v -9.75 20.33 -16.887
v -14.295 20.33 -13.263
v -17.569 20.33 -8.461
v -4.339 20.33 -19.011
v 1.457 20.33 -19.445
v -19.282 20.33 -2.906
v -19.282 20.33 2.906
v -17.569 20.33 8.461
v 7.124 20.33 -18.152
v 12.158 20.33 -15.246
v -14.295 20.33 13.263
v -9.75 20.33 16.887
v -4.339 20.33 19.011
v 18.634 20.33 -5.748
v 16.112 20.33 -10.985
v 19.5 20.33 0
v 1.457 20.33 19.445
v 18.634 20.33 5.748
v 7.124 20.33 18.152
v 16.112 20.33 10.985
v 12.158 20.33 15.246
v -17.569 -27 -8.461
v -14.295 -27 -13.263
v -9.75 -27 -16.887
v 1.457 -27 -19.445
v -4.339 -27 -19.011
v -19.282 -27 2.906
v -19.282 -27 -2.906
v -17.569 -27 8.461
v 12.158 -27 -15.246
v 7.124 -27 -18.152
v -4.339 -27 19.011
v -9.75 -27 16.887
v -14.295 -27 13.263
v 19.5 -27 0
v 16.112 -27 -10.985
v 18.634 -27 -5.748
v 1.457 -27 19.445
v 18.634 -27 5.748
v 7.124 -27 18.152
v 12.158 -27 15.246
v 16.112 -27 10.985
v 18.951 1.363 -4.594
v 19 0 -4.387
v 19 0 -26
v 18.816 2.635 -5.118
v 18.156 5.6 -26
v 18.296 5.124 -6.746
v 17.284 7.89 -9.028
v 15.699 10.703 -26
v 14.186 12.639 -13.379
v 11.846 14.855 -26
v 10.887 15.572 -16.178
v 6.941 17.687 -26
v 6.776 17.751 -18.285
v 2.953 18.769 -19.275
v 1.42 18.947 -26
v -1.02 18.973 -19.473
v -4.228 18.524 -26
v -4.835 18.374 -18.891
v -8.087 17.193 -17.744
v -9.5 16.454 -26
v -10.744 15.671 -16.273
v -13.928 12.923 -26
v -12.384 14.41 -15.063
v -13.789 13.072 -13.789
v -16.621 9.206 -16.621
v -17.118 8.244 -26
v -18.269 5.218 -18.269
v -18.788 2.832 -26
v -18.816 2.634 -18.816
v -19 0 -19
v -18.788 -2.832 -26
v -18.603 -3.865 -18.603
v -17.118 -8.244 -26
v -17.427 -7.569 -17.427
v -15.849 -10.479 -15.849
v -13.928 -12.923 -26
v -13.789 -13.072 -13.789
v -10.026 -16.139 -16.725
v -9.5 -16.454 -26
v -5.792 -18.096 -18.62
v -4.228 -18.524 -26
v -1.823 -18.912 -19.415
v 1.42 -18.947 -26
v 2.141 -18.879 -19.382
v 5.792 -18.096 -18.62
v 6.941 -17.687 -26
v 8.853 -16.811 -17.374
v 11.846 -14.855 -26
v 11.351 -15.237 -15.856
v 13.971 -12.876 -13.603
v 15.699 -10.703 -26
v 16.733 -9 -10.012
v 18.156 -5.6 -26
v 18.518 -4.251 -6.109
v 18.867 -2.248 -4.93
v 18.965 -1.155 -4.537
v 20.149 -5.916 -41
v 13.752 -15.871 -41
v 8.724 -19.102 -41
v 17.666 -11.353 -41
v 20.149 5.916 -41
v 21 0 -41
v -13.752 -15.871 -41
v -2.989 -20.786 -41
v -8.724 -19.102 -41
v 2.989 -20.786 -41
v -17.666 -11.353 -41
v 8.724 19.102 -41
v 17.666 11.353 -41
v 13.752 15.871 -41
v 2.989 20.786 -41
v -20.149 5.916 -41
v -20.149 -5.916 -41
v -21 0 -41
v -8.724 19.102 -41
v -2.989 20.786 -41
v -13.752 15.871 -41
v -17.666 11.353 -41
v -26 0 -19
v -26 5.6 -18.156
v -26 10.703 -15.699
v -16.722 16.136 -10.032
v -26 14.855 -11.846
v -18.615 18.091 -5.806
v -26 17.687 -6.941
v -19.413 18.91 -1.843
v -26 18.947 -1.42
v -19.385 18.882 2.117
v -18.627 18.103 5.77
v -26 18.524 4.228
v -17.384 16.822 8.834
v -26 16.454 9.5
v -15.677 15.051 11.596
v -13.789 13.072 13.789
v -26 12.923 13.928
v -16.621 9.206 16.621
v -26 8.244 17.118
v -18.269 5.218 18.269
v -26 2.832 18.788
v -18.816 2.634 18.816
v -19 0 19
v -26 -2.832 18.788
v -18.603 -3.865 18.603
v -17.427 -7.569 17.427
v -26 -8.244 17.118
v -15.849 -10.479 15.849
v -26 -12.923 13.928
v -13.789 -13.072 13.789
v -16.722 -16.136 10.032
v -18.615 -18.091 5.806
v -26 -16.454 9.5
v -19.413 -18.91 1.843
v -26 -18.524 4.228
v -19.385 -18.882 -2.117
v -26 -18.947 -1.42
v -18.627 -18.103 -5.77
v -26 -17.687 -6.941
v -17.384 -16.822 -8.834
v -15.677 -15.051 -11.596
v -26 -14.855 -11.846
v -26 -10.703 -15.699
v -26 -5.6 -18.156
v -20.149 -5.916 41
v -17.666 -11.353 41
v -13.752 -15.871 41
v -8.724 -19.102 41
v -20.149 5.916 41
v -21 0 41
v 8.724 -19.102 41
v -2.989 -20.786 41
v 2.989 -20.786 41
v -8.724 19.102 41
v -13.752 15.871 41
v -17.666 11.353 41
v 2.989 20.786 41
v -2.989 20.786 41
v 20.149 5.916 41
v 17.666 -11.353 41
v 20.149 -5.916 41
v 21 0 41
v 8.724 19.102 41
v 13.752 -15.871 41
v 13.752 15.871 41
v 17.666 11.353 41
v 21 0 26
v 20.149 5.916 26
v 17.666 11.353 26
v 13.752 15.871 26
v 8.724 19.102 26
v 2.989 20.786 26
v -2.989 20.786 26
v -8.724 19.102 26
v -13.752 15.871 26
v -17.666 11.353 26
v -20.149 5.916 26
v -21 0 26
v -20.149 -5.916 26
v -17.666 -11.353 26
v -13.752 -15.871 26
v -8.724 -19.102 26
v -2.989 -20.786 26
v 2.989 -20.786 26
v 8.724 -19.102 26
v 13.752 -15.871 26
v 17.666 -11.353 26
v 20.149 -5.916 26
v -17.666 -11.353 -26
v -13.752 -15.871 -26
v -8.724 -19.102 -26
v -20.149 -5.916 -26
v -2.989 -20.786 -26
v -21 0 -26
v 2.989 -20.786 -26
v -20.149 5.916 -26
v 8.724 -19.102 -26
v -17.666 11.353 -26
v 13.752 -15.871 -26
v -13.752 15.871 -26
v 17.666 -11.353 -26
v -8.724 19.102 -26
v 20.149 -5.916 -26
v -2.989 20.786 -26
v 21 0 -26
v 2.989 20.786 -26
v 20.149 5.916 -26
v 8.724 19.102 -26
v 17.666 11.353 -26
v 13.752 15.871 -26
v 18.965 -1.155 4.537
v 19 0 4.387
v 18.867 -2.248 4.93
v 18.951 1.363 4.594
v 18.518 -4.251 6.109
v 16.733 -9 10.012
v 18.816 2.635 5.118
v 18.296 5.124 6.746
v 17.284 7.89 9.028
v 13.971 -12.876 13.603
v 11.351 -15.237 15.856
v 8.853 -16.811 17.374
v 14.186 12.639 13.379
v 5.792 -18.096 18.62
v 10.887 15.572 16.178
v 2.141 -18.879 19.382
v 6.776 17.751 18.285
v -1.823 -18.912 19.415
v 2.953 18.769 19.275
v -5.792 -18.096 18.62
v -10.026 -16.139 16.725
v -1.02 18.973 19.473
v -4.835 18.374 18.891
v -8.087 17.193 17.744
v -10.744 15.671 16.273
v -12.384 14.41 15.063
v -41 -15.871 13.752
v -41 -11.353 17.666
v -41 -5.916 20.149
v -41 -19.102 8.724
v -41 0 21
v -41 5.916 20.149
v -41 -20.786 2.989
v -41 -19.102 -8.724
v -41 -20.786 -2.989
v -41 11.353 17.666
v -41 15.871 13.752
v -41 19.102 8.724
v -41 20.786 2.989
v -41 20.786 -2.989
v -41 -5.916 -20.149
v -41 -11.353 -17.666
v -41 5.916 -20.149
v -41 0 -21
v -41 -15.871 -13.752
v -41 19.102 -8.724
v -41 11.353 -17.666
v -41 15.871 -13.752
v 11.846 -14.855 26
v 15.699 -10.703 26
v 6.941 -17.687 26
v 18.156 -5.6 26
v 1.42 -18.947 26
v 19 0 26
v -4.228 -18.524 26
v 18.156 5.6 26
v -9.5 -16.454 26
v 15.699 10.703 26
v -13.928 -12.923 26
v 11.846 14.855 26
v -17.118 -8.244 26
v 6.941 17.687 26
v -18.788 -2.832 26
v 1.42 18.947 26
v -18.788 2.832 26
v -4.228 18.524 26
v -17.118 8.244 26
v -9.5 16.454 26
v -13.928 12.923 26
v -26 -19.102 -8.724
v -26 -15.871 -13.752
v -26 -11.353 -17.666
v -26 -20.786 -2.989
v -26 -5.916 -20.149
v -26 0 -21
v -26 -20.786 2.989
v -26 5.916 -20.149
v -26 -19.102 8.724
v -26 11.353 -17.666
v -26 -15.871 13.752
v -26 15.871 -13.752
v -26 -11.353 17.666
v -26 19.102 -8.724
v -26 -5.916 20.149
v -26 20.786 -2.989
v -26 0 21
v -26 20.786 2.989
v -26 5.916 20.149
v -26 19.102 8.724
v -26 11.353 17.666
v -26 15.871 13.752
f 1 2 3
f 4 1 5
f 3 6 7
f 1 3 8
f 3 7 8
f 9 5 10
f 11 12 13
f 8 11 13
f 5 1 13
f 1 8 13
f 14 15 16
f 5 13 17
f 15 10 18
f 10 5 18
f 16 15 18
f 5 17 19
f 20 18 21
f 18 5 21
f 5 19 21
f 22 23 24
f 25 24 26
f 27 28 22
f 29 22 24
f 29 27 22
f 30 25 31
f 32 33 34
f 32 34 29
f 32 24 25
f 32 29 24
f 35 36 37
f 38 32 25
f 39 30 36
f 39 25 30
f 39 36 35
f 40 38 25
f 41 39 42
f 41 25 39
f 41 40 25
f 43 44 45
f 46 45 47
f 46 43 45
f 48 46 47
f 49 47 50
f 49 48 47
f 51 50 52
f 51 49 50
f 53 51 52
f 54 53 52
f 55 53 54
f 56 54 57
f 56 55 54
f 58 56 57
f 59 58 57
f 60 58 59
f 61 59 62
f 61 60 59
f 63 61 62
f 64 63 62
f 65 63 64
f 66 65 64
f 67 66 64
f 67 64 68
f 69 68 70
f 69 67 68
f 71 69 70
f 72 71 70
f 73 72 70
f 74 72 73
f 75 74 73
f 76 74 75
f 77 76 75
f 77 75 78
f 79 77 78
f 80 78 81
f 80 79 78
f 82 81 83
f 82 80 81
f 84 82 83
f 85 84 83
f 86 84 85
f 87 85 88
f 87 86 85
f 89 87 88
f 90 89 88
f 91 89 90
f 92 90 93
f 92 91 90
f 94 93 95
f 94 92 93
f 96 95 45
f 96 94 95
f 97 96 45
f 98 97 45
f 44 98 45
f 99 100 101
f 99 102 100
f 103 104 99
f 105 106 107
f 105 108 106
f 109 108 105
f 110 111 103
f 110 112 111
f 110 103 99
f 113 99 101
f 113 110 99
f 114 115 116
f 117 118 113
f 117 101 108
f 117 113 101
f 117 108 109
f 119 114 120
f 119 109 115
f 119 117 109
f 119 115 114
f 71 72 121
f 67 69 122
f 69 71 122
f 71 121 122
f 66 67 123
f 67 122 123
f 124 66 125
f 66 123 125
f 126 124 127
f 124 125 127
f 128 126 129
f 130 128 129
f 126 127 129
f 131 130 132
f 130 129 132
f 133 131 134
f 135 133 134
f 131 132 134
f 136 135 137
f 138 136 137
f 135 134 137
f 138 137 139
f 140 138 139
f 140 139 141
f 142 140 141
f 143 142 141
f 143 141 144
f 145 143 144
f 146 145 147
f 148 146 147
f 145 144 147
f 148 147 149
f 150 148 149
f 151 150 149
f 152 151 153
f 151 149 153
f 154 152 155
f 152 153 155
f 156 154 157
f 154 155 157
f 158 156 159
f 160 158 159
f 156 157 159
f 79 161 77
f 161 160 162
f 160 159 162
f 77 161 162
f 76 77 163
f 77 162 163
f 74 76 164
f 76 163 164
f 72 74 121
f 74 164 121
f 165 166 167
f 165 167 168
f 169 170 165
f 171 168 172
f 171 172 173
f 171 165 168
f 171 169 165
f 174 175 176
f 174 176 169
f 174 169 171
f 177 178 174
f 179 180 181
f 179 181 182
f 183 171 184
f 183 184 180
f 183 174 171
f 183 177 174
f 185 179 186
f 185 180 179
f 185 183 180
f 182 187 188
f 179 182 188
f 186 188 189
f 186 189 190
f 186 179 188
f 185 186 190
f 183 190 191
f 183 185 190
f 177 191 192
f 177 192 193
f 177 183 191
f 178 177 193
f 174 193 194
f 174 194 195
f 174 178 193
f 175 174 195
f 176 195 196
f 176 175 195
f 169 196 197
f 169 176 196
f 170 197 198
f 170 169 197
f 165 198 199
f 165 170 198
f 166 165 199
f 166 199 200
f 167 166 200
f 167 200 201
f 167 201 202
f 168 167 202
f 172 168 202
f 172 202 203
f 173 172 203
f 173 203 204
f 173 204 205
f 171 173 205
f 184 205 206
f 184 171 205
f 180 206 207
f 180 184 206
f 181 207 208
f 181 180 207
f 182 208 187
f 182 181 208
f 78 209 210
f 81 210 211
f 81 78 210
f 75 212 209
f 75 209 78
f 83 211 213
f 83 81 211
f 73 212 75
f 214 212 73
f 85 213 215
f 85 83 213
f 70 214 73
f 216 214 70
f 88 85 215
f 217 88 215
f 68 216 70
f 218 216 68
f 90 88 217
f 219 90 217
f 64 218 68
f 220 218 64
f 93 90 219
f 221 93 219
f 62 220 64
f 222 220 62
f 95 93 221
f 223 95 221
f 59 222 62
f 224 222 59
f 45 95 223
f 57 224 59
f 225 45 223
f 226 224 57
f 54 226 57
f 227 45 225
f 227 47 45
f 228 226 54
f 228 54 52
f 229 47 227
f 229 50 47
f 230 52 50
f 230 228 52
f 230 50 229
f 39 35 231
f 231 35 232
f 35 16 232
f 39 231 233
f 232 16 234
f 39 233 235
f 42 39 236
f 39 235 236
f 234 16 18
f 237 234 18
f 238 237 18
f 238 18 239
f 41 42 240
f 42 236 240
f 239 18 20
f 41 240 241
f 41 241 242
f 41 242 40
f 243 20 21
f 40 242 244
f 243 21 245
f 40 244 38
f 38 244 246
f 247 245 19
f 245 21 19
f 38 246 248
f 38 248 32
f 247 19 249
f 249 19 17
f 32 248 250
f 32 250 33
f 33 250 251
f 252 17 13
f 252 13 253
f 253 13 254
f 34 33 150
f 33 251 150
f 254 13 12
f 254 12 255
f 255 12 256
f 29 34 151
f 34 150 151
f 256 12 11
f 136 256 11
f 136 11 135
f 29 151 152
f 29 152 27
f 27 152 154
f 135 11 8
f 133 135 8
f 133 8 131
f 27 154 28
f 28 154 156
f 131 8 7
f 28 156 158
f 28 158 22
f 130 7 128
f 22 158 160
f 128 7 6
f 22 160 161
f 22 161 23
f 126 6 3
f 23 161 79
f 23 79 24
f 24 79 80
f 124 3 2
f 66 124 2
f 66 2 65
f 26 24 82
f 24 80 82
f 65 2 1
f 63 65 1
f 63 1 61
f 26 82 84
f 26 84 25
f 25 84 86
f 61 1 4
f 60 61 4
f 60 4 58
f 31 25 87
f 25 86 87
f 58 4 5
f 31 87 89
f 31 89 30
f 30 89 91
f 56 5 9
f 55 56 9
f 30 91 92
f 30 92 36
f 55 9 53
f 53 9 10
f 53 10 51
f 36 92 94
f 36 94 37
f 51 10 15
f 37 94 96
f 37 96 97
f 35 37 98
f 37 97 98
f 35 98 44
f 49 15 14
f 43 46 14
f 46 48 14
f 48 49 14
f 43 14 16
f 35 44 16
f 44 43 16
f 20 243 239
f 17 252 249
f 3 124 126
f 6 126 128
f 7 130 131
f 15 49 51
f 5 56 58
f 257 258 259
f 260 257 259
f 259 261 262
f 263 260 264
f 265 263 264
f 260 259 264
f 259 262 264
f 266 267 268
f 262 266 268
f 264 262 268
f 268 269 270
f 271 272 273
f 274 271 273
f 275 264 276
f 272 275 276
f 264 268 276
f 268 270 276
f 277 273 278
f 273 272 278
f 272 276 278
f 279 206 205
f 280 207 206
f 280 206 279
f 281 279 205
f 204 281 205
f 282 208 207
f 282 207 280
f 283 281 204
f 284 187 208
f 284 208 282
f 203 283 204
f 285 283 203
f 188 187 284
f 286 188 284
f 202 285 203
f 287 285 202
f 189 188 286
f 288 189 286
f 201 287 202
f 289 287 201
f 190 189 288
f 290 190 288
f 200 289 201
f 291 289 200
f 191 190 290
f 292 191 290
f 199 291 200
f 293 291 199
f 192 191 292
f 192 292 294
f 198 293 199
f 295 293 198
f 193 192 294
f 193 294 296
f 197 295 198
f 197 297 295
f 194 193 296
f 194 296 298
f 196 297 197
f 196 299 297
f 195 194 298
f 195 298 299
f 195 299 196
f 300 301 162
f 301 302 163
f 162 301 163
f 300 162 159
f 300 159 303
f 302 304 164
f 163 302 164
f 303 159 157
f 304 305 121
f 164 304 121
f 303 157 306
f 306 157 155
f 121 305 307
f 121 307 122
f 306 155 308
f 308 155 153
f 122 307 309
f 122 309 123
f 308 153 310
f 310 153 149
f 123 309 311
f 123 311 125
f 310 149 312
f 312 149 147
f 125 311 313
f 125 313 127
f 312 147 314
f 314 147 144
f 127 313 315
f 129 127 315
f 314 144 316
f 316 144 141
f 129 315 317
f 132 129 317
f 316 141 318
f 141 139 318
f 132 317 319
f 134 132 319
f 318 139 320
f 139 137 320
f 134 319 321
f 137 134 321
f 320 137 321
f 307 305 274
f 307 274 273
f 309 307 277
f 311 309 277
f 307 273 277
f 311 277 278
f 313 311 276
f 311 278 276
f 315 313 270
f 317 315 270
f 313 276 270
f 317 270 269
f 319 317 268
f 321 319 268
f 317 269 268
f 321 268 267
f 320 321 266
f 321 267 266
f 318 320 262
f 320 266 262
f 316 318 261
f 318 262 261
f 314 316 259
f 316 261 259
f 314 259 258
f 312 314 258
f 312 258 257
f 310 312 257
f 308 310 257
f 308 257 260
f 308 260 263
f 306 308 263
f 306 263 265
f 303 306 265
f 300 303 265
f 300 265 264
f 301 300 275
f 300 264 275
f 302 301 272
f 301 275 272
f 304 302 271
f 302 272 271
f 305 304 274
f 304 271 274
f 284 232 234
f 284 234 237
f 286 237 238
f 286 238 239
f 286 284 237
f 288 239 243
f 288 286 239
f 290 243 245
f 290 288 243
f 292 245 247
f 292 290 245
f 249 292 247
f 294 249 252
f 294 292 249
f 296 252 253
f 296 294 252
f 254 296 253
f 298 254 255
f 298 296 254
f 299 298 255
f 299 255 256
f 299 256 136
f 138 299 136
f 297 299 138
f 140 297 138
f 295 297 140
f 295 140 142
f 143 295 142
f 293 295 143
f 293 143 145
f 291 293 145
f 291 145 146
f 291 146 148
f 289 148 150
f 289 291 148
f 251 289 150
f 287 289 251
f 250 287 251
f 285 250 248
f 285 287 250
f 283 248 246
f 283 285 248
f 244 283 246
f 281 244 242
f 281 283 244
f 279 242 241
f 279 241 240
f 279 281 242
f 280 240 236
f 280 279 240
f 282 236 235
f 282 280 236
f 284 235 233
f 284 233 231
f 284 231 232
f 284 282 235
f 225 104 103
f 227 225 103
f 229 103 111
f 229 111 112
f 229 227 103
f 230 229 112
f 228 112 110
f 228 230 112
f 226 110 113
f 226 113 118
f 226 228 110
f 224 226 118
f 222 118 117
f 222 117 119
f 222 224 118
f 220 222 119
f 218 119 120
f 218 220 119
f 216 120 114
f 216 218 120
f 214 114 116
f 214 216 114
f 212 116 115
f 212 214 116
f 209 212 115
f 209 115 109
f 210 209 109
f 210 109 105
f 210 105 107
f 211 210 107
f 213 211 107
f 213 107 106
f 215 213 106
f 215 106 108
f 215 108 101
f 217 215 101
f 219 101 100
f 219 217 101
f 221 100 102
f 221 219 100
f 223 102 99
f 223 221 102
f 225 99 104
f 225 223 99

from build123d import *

# Parameters (mm, degrees)
SKETCH002_R  = 19.5
PAD_DEPTH    = 20.33
PAD001_DEPTH = 27


with BuildPart() as part:
    # Sketch → Revolution (revolve)
    with BuildSketch(Plane.XZ):
        Polygon((0, -41), (21, -41), (21, -26), (19, -26), (19, 26), (21, 26), (21, 41), (0, 41), align=None)
    revolve(axis=Axis((0, 0, 0), (0, 0, 1)))

    # Sketch001 → Revolution001 (revolve)
    with BuildSketch(Plane.XZ):
        Polygon((0, 0), (0, -19), (-26, -19), (-26, -21), (-41, -21), (-41, 0), align=None)
    revolve(axis=Axis((0, 0, 0), (1, 0, 0)))

    # Sketch002 → Pad (new body)
    with BuildSketch(Plane.XZ):
        Circle(SKETCH002_R)
    extrude(amount=-PAD_DEPTH)

    # Sketch002 → Pad001 (join)
    with BuildSketch(Plane.XZ):
        Circle(SKETCH002_R)
    extrude(amount=PAD001_DEPTH)


solid = part.part
